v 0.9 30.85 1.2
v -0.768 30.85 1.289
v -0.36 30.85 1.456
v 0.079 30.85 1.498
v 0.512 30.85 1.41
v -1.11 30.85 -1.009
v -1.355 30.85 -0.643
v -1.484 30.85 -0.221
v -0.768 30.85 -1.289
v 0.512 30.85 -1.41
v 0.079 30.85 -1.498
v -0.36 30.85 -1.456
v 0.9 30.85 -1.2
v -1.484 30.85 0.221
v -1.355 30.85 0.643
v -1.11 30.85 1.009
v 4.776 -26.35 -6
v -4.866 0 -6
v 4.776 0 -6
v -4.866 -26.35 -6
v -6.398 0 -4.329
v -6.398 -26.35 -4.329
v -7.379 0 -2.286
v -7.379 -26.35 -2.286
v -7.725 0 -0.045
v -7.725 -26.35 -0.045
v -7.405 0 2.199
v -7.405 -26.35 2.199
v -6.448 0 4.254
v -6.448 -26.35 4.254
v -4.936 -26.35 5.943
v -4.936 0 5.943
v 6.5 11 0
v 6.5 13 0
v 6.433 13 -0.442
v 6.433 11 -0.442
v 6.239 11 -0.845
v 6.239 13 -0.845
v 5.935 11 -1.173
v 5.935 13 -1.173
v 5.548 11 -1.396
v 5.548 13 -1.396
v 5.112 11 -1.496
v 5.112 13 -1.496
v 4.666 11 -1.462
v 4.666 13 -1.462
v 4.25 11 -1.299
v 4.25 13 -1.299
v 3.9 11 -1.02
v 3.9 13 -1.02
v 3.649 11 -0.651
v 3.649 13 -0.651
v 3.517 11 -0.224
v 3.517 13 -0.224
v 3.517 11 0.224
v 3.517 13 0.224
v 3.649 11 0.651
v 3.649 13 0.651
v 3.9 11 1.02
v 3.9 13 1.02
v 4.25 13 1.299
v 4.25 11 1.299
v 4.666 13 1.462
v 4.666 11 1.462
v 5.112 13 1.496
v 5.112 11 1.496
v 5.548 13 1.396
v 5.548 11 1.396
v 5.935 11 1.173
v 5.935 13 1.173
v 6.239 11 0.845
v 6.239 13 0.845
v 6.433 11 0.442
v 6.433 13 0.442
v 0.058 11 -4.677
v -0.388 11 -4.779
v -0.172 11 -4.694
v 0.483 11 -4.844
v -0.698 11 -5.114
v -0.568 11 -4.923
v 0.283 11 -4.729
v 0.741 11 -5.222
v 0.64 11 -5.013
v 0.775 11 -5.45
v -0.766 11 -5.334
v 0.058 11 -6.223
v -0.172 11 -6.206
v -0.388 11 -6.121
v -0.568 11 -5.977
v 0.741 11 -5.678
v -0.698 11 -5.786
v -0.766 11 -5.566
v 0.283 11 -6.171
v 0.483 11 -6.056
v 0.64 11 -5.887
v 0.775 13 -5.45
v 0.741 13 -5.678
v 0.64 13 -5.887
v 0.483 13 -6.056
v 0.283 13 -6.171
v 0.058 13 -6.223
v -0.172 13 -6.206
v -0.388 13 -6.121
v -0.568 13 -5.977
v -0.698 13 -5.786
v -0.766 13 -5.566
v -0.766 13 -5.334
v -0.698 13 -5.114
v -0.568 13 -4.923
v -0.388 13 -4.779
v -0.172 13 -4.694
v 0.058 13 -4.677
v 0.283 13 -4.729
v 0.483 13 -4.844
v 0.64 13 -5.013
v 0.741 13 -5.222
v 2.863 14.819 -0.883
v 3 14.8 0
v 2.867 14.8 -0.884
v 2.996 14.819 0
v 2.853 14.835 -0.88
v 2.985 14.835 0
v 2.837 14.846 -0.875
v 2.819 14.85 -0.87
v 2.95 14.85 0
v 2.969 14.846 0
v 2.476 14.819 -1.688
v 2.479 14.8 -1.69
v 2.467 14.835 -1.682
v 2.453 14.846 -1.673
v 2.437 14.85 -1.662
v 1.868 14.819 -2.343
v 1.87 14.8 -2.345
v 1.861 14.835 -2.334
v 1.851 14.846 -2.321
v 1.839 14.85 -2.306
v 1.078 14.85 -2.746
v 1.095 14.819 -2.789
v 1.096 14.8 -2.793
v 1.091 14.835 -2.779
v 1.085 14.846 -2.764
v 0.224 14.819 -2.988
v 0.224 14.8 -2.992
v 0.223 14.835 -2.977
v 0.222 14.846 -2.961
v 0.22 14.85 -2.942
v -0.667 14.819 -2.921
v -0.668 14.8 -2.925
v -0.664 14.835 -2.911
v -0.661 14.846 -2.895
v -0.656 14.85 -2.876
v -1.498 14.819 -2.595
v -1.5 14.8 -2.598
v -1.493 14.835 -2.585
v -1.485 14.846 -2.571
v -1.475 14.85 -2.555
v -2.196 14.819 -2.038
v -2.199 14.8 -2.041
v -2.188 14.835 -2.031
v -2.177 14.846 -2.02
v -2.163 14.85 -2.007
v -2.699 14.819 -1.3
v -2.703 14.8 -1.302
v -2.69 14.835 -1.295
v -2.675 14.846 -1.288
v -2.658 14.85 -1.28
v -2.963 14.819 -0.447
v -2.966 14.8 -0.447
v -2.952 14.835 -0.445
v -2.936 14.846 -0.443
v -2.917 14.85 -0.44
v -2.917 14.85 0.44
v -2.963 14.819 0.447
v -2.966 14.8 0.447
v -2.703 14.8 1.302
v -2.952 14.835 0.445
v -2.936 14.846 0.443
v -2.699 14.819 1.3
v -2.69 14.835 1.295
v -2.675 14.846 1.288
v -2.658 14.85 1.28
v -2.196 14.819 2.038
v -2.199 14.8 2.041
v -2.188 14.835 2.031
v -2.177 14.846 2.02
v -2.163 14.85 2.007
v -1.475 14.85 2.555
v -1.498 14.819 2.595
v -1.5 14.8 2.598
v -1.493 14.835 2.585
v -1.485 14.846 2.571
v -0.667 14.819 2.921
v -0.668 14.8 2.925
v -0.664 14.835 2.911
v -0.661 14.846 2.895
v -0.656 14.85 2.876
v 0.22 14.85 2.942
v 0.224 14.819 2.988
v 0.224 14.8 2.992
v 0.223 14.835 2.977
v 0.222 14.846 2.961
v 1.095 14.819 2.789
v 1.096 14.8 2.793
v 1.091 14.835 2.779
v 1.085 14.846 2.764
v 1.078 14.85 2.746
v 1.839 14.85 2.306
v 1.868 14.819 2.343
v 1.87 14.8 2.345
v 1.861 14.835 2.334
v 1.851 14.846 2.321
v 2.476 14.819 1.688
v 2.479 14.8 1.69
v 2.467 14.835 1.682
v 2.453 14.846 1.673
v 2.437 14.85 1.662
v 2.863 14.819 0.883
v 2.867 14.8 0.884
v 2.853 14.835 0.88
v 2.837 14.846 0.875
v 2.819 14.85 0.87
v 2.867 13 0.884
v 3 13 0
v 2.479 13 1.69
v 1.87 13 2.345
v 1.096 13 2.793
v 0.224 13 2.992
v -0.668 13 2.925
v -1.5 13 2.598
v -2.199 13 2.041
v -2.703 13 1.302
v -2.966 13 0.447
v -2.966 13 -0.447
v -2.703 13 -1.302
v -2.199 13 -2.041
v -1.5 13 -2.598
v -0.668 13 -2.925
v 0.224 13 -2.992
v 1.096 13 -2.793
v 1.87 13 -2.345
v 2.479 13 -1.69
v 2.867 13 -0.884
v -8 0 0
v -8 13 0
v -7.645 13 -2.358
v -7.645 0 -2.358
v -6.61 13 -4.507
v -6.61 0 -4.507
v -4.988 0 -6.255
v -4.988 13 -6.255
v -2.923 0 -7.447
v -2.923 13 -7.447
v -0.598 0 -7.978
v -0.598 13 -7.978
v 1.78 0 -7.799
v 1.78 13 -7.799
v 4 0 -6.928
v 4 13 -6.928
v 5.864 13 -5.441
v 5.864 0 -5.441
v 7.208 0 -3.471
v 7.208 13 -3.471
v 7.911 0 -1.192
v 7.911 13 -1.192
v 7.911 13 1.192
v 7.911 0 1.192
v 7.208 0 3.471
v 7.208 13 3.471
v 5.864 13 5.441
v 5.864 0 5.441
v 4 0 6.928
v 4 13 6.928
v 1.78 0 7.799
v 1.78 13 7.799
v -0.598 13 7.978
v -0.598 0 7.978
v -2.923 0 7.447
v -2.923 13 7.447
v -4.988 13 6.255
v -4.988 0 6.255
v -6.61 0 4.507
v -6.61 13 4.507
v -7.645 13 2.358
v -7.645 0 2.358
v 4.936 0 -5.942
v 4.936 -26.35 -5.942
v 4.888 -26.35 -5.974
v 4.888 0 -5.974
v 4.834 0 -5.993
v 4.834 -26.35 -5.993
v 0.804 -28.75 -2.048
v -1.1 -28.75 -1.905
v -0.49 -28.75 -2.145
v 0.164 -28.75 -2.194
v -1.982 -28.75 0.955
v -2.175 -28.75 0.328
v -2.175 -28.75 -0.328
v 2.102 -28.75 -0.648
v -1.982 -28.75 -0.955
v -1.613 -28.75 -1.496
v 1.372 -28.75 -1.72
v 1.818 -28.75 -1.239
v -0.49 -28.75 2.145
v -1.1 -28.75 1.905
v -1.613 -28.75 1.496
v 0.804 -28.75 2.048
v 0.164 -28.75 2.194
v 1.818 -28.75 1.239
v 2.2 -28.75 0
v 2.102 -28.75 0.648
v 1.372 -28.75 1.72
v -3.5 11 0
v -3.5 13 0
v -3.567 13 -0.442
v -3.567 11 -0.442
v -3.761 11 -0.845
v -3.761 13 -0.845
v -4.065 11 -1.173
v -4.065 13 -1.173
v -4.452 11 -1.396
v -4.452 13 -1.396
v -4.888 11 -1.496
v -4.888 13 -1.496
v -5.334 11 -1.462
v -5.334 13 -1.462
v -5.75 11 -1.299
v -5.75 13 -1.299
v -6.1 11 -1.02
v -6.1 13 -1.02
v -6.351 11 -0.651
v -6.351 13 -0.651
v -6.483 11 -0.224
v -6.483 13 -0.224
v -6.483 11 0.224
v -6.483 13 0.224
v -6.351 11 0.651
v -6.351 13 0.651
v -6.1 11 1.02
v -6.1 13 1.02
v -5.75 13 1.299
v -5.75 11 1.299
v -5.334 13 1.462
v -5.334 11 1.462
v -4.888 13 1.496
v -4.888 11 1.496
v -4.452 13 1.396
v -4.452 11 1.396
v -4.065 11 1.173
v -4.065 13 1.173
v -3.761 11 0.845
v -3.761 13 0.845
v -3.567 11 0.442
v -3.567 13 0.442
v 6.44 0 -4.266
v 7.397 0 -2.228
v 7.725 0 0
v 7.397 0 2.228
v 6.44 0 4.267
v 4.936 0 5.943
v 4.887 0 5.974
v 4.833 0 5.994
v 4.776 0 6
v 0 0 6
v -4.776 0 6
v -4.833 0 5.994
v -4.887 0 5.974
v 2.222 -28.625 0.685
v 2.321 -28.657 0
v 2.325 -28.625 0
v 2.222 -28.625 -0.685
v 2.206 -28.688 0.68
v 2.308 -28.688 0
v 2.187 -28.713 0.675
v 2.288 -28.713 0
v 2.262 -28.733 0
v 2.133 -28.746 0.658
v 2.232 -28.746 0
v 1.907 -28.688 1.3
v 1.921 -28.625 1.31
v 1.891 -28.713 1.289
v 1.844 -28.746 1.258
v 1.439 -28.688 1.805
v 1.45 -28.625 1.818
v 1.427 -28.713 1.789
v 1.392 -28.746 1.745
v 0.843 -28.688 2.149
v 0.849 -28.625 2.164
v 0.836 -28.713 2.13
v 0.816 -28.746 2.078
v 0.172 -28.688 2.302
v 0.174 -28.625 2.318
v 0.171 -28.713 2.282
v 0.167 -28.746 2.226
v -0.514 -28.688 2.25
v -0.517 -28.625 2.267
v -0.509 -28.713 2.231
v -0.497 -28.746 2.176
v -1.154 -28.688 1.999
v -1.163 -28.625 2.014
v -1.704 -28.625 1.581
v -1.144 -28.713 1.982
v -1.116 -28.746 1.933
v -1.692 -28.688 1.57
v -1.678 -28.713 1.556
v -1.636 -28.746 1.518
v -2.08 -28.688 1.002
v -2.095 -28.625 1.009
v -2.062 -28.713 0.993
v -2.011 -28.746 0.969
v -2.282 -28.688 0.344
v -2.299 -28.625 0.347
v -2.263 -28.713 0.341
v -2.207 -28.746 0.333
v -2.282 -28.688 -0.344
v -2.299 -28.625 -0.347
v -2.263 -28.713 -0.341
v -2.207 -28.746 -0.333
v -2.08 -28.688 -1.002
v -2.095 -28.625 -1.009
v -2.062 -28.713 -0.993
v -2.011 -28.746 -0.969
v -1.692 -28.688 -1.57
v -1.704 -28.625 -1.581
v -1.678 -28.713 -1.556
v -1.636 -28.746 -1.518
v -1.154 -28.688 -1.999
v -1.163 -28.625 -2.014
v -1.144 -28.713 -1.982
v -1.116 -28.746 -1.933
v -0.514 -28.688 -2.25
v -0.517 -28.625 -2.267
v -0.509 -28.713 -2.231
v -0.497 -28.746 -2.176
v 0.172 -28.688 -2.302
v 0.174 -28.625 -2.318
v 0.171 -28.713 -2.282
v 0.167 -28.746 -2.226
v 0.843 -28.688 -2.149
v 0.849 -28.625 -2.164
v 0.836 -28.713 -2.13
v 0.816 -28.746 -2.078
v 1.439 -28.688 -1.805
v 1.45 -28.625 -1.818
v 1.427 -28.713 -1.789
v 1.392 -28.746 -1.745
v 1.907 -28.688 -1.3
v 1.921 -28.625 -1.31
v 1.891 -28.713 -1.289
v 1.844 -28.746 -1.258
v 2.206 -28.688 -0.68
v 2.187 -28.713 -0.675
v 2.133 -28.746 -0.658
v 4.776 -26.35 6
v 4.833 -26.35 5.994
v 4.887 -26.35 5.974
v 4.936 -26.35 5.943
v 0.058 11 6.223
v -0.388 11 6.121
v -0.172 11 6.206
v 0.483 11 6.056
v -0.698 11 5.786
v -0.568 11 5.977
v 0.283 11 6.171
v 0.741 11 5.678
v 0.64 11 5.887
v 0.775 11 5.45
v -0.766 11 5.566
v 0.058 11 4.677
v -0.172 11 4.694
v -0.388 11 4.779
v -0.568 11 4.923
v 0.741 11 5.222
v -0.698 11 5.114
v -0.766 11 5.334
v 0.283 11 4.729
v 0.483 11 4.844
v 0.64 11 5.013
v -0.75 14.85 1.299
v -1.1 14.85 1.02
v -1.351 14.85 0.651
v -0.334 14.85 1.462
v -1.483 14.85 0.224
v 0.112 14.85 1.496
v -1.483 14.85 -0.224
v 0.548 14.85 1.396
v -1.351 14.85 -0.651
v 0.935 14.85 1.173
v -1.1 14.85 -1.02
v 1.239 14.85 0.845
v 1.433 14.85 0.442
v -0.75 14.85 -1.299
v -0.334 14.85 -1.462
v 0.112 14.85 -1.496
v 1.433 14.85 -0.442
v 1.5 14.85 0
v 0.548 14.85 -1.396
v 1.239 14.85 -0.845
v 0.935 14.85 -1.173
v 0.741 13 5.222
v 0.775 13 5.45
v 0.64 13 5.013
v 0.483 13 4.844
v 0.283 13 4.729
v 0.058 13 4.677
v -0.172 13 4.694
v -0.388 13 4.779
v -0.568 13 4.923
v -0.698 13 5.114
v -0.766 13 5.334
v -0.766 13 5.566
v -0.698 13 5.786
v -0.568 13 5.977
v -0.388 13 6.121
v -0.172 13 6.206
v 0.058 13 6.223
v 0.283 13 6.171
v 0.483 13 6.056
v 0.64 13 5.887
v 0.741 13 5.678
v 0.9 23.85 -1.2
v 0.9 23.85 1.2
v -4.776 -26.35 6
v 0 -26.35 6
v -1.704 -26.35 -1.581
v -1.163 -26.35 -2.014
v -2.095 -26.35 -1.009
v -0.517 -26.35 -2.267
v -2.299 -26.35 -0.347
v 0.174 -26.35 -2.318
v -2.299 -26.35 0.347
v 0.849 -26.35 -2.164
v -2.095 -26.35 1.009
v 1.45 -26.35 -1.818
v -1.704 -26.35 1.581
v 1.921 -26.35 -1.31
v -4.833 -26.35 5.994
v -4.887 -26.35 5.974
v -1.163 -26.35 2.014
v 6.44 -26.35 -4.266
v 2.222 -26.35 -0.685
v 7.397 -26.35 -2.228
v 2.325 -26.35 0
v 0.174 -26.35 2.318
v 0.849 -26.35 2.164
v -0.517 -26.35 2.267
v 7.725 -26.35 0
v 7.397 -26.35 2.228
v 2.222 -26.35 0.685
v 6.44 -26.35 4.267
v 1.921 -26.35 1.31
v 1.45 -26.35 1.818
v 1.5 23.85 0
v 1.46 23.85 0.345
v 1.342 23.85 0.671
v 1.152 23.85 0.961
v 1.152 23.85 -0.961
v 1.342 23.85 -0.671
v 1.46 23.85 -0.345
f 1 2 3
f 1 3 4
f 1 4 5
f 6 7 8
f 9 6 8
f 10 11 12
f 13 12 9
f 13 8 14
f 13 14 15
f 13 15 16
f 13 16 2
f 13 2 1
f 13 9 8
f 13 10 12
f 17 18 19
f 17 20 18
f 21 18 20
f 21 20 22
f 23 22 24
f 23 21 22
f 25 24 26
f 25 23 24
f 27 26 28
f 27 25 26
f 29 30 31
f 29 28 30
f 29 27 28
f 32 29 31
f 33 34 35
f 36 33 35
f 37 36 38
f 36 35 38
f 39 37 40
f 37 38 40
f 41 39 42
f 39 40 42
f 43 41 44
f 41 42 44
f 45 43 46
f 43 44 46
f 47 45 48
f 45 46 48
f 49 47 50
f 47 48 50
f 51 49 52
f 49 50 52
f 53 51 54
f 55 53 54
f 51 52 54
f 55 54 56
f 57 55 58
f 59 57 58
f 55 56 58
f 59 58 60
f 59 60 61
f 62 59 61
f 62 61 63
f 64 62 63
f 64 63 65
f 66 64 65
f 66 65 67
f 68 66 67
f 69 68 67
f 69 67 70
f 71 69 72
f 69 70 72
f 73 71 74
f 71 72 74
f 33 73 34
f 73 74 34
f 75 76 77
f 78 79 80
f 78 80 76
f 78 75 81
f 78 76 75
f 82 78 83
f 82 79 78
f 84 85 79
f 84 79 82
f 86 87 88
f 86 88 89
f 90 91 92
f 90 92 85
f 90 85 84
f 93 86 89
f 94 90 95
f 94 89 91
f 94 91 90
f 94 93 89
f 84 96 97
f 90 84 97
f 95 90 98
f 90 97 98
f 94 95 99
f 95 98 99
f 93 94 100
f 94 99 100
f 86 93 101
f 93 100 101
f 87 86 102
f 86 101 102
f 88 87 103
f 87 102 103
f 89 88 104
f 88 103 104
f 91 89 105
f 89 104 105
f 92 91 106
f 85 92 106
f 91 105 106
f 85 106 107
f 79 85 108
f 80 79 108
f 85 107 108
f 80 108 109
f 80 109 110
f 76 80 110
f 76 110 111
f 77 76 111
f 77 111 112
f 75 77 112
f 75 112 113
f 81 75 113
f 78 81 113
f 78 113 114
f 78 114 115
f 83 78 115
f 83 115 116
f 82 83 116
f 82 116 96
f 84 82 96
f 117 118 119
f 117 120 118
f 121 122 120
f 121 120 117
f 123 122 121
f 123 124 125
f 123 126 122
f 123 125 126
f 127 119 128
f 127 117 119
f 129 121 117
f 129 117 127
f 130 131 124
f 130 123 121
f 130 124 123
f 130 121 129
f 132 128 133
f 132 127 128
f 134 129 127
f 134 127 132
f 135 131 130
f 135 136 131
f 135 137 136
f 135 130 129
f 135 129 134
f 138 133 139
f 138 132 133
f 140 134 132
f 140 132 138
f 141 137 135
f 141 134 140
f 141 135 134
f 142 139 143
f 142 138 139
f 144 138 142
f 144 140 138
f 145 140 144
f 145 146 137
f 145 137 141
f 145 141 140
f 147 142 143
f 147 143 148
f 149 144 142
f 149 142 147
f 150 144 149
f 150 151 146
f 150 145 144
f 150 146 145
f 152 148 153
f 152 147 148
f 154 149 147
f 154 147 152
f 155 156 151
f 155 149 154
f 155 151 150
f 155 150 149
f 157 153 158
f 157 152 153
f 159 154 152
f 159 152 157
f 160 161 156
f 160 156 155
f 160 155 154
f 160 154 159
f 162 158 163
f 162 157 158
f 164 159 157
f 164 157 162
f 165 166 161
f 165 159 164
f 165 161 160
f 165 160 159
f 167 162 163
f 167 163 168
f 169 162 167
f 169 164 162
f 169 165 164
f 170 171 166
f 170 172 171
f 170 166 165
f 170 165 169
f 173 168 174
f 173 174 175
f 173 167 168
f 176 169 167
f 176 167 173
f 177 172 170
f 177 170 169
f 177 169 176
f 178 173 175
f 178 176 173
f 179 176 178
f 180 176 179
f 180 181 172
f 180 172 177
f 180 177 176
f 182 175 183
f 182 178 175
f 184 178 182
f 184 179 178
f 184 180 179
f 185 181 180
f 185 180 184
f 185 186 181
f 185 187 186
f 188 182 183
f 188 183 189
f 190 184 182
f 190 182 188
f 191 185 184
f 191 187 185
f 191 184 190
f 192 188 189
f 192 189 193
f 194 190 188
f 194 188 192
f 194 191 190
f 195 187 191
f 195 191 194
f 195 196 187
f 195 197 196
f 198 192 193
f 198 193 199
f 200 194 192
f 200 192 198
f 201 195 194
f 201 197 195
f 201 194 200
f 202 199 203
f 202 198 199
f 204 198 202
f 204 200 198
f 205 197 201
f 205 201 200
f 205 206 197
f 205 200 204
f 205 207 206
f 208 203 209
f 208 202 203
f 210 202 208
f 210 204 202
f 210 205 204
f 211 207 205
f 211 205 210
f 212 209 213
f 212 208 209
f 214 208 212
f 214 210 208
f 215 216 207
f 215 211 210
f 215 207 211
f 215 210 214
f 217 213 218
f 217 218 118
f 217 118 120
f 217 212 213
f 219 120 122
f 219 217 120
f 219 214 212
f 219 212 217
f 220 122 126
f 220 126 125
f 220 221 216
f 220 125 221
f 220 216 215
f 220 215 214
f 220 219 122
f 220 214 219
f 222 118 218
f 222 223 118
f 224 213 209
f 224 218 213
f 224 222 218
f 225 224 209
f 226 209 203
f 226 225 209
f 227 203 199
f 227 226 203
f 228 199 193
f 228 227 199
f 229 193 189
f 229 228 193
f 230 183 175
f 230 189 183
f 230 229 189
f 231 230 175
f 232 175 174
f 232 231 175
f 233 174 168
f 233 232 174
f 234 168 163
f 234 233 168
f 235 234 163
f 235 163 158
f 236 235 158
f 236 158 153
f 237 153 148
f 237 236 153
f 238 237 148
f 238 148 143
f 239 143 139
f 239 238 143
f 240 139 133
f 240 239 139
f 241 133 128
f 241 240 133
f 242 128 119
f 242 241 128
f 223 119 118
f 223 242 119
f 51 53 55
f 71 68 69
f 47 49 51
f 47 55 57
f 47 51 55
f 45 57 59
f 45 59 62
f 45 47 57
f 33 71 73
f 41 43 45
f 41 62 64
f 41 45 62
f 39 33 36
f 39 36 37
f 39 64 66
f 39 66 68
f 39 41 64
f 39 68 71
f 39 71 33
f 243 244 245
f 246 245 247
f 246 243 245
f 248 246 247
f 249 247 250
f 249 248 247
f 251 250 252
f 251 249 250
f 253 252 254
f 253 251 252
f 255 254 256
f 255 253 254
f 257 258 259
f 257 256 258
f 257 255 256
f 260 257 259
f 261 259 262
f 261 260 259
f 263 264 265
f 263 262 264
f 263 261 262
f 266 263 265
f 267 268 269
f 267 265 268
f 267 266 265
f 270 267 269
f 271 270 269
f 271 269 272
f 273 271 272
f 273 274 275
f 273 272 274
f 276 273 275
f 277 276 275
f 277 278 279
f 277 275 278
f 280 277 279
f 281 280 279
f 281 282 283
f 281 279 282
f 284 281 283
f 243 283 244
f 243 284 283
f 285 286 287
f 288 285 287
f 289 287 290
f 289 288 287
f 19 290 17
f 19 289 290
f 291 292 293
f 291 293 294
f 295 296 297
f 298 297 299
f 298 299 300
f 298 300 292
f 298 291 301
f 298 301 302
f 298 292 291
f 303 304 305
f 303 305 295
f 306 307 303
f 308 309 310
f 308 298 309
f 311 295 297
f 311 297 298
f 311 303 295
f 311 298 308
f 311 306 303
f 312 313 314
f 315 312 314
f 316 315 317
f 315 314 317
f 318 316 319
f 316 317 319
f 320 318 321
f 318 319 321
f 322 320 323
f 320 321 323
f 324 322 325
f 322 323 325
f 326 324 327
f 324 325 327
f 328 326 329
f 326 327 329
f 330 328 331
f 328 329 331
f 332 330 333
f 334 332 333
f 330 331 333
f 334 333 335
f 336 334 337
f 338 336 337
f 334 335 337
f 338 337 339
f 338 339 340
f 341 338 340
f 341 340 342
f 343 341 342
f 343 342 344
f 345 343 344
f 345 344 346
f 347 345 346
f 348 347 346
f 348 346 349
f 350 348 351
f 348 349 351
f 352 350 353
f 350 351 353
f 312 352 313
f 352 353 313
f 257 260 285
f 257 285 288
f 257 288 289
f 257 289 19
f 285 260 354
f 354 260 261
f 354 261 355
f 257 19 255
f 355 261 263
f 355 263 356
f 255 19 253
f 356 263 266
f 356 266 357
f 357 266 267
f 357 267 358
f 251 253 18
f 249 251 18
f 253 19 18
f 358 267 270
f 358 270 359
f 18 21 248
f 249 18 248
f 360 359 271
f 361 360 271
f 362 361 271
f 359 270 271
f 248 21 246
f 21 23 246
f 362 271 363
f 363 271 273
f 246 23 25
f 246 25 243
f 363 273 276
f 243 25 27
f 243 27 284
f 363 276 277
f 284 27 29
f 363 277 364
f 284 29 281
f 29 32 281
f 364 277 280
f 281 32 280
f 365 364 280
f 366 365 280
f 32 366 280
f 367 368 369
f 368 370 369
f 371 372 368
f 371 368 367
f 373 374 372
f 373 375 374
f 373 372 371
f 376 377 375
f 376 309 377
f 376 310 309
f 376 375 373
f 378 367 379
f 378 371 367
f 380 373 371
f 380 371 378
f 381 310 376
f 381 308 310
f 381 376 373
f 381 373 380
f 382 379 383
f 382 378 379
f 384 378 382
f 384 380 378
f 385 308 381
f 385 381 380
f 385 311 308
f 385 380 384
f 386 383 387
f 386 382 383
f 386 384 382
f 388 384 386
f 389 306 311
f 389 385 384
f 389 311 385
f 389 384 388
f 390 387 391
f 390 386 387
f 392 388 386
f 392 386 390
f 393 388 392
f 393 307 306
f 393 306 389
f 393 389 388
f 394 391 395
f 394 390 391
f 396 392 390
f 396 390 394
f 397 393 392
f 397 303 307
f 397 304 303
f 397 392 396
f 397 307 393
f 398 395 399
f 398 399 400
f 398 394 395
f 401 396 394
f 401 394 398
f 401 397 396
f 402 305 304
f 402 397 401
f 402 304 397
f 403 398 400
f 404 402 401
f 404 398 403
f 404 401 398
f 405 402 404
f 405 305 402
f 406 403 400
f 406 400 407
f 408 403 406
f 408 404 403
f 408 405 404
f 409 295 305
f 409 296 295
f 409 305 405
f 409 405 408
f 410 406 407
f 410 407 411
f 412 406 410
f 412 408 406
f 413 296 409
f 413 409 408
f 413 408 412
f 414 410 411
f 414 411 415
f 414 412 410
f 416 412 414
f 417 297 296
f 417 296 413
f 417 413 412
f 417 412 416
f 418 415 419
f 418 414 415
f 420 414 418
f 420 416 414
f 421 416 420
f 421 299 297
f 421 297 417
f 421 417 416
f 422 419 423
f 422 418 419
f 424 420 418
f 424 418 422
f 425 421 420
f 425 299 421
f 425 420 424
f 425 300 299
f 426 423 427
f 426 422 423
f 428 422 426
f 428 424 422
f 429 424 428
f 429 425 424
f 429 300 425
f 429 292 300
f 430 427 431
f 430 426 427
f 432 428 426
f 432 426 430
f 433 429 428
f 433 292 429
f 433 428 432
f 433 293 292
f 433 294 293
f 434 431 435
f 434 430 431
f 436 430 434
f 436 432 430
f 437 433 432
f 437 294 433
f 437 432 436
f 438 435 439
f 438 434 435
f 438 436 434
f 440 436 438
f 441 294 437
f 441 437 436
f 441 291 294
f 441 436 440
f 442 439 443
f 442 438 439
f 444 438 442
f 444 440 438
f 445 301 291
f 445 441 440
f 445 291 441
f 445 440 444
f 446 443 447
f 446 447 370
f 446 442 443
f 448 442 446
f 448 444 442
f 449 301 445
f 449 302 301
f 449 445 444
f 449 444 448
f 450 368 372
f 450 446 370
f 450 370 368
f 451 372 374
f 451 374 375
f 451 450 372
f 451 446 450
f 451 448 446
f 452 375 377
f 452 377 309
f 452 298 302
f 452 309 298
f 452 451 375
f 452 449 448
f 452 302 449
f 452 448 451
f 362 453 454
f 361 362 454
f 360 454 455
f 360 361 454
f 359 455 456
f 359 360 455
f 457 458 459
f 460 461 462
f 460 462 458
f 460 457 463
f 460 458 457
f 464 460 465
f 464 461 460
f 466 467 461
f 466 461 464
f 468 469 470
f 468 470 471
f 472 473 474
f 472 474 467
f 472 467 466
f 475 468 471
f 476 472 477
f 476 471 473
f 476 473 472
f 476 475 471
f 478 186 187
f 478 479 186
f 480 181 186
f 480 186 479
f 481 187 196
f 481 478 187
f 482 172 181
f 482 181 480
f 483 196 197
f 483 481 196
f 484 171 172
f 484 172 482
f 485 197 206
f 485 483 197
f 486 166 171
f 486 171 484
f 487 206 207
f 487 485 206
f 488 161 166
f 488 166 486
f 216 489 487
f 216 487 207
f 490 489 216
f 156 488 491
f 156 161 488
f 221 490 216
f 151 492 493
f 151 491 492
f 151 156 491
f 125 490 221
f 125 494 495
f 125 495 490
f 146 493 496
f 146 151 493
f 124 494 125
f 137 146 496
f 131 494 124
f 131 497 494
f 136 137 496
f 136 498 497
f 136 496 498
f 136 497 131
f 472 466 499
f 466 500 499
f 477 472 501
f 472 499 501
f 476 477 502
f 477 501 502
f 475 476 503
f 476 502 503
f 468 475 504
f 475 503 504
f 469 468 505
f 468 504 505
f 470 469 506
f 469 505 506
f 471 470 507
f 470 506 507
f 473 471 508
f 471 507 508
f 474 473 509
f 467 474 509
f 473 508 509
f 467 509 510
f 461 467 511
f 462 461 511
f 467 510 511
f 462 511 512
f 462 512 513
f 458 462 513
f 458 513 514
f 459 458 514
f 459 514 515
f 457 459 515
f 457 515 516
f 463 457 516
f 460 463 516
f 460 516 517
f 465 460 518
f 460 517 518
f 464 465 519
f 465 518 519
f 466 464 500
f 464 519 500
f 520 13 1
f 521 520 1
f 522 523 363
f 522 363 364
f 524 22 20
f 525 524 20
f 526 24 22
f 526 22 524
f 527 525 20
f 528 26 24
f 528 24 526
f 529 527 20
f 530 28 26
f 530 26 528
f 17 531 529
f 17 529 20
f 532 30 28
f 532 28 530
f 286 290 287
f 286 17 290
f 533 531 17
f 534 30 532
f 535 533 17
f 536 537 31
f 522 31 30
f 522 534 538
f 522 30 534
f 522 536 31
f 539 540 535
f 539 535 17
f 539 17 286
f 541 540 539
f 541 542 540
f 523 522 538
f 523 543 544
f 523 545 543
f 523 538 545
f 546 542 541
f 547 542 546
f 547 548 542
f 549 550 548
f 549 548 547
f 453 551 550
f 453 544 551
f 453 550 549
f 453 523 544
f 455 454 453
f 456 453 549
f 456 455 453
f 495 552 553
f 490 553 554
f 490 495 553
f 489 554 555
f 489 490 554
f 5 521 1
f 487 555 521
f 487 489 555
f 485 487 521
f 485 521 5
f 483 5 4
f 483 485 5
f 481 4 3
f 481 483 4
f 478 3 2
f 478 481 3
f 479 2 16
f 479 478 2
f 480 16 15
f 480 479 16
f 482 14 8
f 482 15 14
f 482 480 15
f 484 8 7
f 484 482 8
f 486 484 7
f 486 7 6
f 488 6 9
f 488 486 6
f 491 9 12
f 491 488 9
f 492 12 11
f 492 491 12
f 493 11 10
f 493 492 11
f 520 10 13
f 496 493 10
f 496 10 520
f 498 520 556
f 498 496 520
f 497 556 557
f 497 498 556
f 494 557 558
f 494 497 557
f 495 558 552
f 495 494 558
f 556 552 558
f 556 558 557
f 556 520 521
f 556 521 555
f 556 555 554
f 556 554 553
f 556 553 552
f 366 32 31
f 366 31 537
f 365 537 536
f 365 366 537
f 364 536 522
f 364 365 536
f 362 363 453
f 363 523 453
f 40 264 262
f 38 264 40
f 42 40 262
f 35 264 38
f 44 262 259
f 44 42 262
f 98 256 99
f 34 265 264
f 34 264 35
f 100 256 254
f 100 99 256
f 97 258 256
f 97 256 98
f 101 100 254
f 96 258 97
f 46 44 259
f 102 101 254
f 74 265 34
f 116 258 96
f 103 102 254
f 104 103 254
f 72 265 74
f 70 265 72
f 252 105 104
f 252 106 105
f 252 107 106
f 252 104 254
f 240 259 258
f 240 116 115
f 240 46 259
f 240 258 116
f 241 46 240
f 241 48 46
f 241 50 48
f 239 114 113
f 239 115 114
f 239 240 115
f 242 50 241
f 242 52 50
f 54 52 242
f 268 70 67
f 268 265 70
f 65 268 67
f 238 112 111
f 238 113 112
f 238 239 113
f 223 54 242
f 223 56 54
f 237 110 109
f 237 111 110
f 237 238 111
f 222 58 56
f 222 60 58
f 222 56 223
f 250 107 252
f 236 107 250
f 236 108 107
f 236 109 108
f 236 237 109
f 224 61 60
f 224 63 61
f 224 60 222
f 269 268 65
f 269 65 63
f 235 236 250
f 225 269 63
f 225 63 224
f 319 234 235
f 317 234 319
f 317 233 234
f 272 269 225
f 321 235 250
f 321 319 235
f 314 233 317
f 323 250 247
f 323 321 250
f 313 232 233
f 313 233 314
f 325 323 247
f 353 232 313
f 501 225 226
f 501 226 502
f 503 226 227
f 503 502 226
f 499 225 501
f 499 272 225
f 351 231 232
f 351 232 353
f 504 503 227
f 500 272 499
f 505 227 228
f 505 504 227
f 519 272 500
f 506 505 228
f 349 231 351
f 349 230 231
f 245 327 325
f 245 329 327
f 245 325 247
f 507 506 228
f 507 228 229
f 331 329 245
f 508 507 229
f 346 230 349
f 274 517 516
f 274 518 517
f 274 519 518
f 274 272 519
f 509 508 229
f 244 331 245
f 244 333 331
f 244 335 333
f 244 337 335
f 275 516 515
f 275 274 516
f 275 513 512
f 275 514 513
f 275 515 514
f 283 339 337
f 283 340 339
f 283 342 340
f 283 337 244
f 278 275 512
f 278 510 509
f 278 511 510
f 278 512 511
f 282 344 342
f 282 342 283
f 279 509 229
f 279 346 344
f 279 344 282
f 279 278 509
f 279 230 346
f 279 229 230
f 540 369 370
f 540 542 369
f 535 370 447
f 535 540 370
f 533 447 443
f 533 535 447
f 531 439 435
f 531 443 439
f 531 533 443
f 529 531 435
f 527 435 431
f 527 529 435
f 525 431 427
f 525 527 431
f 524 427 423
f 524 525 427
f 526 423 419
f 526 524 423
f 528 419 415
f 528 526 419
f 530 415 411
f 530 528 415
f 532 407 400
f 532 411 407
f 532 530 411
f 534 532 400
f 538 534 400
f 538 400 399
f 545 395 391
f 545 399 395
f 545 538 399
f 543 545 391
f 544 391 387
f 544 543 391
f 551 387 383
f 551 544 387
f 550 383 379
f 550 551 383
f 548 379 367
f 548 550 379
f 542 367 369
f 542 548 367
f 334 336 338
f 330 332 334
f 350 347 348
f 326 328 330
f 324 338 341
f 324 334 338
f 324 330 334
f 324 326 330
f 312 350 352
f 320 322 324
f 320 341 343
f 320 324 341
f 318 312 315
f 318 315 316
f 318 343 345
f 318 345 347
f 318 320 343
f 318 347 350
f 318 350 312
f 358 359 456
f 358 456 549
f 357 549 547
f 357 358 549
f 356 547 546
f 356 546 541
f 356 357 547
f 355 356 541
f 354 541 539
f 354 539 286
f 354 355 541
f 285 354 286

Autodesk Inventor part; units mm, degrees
ref_plane "YZ Plane" through (0, 0, 0) normal (1, 0, 0) x (0, 1, 0)
ref_plane "XZ Plane" through (0, 0, 0) normal (0, 1, 0) x (-1, 0, 0)
ref_plane "XY Plane" through (0, 0, 0) normal (0, 0, 1) x (1, 0, 0)
sketch "Sketch1" plane through (0, 0, 0) normal (0, 1, 0) x (-1, 0, 0)
  circle A0 centre (0, 0) radius 8
  dimension "d0" = 16
extrude "Extrusion1" add sketch "Sketch1" along normal blind 13
sketch "Sketch2" plane through (0, 13, 0) normal (0, 1, 0) x (1, 0, 0)
  circle A0 centre (0, 0) radius 3
  dimension "d3" = 6
extrude "Extrusion2" add sketch "Sketch2" along normal blind 1.85
sketch "Sketch3" plane through (0, 14.85, 0) normal (0, 1, 0) x (1, 0, 0)
  circle A0 centre (0, 0) radius 1.5
  dimension "d6" = 3
extrude "Extrusion3" add sketch "Sketch3" along normal blind 16
sketch "Sketch4" plane through (0, 30.85, 0) normal (0, 1, 0) x (1, 0, 0)
  circle A0 centre (0, 0) radius 1.5 projected
  line L0 (0.9, 0) -> (0.9, 1.2)
  line L1 (0.9, 1.2) -> (0.9, -1.2)
  circle A1 centre (0, 0) radius 3 projected
  arc A2 (0.9, -1.2) -> (0.9, 1.2) centre (0, 0) ccw
extrude "Extrusion4" cut sketch "Sketch4" against normal blind 7 contours A0 L1 L0 picked at (0.9839, 0.7204)
sketch "Sketch5" plane through (0, 13, 0) normal (0, 1, 0) x (1, 0, 0)
  circle A0 centre (5, 0) radius 1.5
  circle A1 centre (-5, 0) radius 1.5
  point P0 (0, 0)
extrude "Extrusion5" cut sketch "Sketch5" against normal blind 2
sketch "Sketch6" plane through (0, 13, 0) normal (0, 1, 0) x (1, 0, 0)
  circle A0 centre (0, 0) radius 8 projected
  circle A1 centre (0, -5.45) radius 0.775
  line L0 (-8, 0) -> (8, 0)
  circle A2 centre (0, 5.45) radius 0.775
extrude "Extrusion6" cut sketch "Sketch6" against normal blind 2 contours A1 | A2
sketch "Sketch7" plane through (0, 13, 0) normal (0, 1, 0) x (1, 0, 0)
  point P0 (0, 0)
sketch "Sketch8" plane through (0, 0, 0) normal (0, -1, 0) x (1, 0, 0)
  circle A0 centre (0, 0) radius 7.725
  dimension "d22" = 15.45
extrude "Extrusion7" add sketch "Sketch8" along normal blind 26.35
sketch "Sketch9" plane through (0, -26.35, 0) normal (0, -1, 0) x (1, 0, 0)
  line L0 (0, -6) -> (-4.8658, -6)
  circle A0 centre (0, 0) radius 7.725 projected
  line L1 (0, -6) -> (4.8658, -6)
  line L2 (0, 6) -> (-4.8653, 6.0004)
  line L3 (0, 6) -> (4.8652, 6.0004)
  arc A1 (-4.8658, -6) -> (4.8658, -6) centre (0, 0) ccw
  arc A2 (4.8652, 6.0004) -> (-4.8653, 6.0004) centre (0, 0) ccw
extrude "Extrusion8" cut sketch "Sketch9" against normal blind 26.35 contours L1 A0 L0 | A0 L3 L2
sketch "Sketch10" plane through (0, -26.35, 0) normal (0, -1, 0) x (1, 0, 0)
  circle A0 centre (0, 0) radius 2.325
  dimension "d29" = 4.65
extrude "Extrusion9" add sketch "Sketch10" along normal blind 2.4
fillet "Fillet1" radius 0.125 1 edges at (-2.325, -28.75, 0)
fillet "Fillet2" radius 0.05 1 edges at (-3, 14.85, 0)
fillet "Fillet3" radius 0.25 3 edges at (4.8658, -13.175, -6) (-4.8653, -13.175, 6.0004) (4.8652, -13.175, 6.0004)
properties part number "Dc Motor 3mm D Shaft"
